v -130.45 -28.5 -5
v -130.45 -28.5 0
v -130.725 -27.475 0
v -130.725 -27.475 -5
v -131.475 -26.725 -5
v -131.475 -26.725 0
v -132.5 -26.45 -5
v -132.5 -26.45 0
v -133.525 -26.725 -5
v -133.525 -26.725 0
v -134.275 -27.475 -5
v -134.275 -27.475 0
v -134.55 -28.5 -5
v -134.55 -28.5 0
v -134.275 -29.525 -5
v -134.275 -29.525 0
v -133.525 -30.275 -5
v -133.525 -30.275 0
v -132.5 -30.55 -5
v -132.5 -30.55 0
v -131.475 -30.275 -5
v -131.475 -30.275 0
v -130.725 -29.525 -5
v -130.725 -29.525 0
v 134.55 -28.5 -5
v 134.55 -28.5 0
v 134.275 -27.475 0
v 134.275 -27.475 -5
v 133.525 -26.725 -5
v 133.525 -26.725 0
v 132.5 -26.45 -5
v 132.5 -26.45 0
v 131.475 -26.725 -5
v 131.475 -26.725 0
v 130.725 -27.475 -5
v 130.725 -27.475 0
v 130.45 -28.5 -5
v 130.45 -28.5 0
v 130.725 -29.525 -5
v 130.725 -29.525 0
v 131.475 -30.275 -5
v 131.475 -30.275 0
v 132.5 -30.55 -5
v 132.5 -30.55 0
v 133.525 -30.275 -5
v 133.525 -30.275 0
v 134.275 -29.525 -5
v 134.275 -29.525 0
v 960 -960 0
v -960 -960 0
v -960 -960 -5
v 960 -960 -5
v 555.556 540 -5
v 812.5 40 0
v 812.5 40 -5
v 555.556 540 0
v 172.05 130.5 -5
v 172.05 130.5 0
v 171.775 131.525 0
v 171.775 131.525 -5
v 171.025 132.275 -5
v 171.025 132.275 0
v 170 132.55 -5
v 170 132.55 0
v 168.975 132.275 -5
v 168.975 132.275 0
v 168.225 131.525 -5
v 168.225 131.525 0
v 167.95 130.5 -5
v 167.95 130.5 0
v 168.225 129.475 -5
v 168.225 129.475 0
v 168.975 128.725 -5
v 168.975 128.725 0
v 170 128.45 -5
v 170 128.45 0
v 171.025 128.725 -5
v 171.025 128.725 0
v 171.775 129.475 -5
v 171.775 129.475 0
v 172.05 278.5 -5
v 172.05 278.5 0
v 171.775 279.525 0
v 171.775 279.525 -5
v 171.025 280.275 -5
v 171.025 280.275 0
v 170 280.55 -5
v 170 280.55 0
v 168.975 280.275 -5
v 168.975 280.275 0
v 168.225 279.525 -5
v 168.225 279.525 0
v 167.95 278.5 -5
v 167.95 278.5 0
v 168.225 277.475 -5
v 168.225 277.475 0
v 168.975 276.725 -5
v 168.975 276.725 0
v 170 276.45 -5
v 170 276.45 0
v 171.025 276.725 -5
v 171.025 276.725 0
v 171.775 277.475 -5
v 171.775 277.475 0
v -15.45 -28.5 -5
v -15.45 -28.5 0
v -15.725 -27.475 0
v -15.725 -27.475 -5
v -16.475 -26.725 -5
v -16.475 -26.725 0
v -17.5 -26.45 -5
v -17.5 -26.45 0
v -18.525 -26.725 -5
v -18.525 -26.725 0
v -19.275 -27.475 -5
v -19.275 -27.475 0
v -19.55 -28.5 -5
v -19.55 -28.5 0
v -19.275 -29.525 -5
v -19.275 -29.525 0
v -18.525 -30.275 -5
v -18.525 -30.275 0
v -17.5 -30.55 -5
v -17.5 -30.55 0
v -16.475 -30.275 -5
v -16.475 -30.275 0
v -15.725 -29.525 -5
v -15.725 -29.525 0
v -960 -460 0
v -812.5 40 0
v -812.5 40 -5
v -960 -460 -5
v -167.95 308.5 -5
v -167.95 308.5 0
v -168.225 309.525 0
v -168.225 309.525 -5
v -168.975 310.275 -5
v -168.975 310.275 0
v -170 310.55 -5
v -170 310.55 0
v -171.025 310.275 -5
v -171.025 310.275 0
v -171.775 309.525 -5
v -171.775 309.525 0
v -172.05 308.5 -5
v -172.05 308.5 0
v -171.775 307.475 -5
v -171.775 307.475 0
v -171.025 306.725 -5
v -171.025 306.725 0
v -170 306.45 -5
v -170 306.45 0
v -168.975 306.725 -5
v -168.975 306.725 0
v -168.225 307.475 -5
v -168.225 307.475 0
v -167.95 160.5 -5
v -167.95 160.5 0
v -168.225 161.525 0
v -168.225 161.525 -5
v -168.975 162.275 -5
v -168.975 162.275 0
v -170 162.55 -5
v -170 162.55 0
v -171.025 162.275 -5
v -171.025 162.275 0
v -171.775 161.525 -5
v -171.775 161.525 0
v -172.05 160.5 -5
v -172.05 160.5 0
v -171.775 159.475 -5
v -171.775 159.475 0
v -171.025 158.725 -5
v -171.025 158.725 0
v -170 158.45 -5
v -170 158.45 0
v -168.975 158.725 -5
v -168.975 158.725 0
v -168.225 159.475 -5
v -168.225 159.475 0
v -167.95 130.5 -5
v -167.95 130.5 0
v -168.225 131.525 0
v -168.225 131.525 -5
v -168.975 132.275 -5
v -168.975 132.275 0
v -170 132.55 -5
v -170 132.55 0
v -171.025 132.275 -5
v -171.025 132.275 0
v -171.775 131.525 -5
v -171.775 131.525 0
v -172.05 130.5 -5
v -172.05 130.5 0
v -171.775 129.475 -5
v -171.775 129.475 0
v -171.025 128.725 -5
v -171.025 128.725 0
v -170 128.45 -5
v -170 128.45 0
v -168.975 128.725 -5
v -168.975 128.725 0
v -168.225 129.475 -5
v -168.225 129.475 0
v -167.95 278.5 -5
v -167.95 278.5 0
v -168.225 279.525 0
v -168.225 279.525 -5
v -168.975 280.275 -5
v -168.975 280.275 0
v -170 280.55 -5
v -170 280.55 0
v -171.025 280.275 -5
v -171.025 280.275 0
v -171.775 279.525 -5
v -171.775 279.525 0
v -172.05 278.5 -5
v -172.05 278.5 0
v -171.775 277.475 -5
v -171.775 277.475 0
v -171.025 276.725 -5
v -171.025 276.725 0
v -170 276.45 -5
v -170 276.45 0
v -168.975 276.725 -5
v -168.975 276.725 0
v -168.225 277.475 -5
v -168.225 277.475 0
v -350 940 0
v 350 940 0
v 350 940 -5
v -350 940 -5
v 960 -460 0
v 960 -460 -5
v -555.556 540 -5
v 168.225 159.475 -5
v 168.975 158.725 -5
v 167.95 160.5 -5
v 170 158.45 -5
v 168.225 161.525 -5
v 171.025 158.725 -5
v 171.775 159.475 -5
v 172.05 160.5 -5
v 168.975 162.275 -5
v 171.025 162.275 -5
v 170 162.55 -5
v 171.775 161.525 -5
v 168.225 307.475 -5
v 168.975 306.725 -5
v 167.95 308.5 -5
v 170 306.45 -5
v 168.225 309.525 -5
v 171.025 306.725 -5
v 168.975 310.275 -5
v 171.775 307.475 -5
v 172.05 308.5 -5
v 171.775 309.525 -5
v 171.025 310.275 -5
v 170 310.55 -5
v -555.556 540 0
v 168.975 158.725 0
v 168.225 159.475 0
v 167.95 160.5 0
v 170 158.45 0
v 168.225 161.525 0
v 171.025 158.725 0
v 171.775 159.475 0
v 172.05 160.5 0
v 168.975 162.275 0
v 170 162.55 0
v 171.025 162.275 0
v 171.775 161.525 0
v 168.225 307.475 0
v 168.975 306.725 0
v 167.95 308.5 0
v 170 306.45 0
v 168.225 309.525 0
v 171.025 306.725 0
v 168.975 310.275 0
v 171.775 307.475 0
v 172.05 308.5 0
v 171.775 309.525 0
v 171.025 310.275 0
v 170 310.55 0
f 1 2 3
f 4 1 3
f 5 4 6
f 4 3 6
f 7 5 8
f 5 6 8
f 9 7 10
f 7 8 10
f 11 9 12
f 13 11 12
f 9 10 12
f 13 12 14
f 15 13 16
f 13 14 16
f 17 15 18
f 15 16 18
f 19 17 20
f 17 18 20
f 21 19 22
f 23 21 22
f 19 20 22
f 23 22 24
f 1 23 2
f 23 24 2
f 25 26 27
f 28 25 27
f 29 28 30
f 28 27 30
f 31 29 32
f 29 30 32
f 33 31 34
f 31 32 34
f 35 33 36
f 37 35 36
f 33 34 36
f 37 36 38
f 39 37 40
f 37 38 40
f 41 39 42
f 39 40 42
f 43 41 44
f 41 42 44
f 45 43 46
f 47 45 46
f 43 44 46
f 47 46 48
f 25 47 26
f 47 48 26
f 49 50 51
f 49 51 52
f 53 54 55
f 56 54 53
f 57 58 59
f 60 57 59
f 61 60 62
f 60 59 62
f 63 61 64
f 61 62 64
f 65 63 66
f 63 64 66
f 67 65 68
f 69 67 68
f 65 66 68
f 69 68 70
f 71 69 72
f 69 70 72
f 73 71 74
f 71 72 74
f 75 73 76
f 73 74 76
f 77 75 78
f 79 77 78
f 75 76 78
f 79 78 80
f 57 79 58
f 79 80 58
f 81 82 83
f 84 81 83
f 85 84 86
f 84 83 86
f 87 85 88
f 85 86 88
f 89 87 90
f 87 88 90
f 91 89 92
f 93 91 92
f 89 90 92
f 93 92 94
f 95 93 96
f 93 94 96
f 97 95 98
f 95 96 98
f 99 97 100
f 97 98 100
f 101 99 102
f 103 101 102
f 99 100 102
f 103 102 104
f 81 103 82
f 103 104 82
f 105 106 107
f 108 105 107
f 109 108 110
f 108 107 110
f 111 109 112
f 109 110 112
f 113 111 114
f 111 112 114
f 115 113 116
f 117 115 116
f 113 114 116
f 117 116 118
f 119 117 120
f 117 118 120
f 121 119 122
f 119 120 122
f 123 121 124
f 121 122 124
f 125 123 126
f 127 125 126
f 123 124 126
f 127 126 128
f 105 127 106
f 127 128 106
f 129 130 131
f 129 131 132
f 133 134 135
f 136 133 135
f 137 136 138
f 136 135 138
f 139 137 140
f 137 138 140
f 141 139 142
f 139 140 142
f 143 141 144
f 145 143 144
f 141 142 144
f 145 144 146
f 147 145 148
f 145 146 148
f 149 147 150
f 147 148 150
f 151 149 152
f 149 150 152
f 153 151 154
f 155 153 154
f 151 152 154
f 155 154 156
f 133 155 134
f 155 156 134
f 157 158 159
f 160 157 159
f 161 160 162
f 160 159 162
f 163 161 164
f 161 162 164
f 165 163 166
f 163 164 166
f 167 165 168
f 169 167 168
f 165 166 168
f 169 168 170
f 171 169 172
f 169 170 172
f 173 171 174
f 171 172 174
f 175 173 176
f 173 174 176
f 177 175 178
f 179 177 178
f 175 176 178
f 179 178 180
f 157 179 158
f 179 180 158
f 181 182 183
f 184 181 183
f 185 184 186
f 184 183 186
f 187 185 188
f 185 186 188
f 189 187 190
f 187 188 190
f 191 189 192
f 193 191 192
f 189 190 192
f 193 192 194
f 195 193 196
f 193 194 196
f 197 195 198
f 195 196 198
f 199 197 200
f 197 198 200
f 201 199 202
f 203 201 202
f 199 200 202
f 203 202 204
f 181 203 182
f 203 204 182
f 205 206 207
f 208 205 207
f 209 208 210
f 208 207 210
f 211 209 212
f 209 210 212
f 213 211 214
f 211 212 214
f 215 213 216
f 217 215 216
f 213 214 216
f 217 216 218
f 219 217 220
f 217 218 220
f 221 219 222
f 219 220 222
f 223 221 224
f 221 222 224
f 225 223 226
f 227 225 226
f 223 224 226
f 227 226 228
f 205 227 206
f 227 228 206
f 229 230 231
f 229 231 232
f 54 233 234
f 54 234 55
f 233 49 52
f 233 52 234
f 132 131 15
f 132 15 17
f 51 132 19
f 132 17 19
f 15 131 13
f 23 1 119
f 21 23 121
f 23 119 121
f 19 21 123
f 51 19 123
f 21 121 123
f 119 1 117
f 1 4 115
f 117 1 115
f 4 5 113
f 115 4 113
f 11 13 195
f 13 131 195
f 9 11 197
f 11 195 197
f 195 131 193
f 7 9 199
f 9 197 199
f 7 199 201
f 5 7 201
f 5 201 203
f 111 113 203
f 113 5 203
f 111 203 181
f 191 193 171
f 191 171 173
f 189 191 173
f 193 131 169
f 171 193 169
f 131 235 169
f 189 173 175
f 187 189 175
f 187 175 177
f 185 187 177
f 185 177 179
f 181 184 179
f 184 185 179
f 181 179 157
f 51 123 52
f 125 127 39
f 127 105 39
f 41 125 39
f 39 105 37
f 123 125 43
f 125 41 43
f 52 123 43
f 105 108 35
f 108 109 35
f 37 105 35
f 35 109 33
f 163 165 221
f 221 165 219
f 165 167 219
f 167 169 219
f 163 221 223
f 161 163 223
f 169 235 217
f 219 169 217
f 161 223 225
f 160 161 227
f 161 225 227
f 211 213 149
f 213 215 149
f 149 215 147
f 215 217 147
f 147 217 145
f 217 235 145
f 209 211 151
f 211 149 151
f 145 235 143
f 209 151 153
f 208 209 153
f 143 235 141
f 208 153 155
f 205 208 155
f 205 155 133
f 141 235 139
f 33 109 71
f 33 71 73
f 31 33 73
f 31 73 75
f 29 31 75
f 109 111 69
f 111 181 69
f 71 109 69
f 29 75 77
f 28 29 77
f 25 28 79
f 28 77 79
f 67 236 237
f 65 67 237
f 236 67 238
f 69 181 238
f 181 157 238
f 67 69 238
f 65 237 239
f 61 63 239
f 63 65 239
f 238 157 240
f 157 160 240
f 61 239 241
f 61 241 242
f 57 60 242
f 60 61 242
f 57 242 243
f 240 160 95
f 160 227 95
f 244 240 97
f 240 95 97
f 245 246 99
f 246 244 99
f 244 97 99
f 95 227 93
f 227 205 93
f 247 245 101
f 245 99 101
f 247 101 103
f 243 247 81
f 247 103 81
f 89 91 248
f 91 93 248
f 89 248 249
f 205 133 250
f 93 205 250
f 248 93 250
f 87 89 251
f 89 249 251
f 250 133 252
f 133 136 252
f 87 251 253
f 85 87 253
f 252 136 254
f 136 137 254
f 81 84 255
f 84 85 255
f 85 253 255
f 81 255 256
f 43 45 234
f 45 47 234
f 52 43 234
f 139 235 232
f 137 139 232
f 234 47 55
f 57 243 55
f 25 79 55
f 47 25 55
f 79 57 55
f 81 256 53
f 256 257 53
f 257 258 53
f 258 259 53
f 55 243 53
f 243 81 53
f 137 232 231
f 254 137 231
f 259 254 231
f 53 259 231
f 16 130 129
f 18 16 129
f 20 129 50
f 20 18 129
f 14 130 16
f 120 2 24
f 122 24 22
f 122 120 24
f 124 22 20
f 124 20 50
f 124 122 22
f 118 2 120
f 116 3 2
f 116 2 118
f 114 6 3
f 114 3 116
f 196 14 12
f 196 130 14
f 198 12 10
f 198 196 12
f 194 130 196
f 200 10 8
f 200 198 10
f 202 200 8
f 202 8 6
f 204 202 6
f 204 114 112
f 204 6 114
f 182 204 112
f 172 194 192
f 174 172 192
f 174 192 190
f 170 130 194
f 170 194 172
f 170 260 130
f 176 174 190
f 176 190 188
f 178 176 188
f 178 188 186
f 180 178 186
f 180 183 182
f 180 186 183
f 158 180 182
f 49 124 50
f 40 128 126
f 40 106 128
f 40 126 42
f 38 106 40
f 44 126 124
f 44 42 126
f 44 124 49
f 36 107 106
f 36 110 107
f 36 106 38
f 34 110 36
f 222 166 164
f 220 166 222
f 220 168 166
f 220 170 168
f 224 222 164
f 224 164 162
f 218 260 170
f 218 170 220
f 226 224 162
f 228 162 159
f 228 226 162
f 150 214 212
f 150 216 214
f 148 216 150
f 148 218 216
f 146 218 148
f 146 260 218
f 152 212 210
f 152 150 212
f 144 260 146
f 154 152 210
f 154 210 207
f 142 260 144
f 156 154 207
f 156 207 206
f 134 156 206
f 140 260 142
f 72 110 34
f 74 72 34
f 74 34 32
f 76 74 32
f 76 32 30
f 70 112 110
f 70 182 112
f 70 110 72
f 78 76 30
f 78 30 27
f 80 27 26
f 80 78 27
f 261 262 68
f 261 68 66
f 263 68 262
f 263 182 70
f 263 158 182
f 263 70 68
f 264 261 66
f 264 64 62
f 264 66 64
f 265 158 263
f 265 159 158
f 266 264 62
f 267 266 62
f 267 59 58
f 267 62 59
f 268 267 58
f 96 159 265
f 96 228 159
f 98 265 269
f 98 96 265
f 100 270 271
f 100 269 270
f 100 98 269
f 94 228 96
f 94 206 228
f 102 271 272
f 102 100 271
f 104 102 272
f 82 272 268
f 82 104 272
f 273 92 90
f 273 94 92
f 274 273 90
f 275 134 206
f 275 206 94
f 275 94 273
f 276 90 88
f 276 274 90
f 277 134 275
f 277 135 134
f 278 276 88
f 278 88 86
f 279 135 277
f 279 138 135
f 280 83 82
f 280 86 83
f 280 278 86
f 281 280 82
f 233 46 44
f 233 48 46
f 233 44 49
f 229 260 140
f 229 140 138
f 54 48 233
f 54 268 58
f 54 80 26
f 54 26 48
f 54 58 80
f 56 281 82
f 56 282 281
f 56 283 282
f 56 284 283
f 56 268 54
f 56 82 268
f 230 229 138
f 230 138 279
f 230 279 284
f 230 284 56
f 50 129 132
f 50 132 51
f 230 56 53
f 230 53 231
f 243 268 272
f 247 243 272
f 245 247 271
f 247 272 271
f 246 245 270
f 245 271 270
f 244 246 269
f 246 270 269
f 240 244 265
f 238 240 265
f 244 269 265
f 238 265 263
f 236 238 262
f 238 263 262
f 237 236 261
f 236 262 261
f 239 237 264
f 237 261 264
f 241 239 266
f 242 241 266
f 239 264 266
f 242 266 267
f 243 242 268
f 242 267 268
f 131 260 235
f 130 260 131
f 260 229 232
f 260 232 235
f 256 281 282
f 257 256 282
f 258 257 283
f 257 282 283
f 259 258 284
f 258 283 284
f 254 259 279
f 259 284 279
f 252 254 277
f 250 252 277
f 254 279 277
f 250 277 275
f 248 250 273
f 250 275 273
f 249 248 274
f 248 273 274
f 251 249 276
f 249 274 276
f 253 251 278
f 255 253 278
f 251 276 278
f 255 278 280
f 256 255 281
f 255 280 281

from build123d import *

# Parameters (mm, degrees)
F0_R     = 2.05
F1_DEPTH = 5


with BuildPart() as f1:
    # F0 (on Top) → F1 (new body)
    with BuildSketch(Plane.XY):
        Polygon((-960, -460), (-960, -960), (960, -960), (960, -460), (812.5, 40), (555.555556, 540), (-555.555556, 540), (-812.5, 40), align=None)
        with Locations((-132.5, -28.5)):
            Circle(F0_R, mode=Mode.SUBTRACT)
        with Locations((-17.5, -28.5)):
            Circle(F0_R, mode=Mode.SUBTRACT)
        with Locations((132.5, -28.5)):
            Circle(F0_R, mode=Mode.SUBTRACT)
        with Locations((-170, 130.5)):
            Circle(F0_R, mode=Mode.SUBTRACT)
        with Locations((-170, 160.5)):
            Circle(F0_R, mode=Mode.SUBTRACT)
        with Locations((-170, 278.5)):
            Circle(F0_R, mode=Mode.SUBTRACT)
        with Locations((-170, 308.5)):
            Circle(F0_R, mode=Mode.SUBTRACT)
        with Locations((170, 130.5)):
            Circle(F0_R, mode=Mode.SUBTRACT)
        with Locations((170, 160.5)):
            Circle(F0_R, mode=Mode.SUBTRACT)
        with Locations((170, 278.5)):
            Circle(F0_R, mode=Mode.SUBTRACT)
        with Locations((170, 308.5)):
            Circle(F0_R, mode=Mode.SUBTRACT)
        Polygon((-350, 940), (-555.555556, 540), (555.555556, 540), (350, 940), align=None)
    extrude(amount=-F1_DEPTH)


solid = f1.part
